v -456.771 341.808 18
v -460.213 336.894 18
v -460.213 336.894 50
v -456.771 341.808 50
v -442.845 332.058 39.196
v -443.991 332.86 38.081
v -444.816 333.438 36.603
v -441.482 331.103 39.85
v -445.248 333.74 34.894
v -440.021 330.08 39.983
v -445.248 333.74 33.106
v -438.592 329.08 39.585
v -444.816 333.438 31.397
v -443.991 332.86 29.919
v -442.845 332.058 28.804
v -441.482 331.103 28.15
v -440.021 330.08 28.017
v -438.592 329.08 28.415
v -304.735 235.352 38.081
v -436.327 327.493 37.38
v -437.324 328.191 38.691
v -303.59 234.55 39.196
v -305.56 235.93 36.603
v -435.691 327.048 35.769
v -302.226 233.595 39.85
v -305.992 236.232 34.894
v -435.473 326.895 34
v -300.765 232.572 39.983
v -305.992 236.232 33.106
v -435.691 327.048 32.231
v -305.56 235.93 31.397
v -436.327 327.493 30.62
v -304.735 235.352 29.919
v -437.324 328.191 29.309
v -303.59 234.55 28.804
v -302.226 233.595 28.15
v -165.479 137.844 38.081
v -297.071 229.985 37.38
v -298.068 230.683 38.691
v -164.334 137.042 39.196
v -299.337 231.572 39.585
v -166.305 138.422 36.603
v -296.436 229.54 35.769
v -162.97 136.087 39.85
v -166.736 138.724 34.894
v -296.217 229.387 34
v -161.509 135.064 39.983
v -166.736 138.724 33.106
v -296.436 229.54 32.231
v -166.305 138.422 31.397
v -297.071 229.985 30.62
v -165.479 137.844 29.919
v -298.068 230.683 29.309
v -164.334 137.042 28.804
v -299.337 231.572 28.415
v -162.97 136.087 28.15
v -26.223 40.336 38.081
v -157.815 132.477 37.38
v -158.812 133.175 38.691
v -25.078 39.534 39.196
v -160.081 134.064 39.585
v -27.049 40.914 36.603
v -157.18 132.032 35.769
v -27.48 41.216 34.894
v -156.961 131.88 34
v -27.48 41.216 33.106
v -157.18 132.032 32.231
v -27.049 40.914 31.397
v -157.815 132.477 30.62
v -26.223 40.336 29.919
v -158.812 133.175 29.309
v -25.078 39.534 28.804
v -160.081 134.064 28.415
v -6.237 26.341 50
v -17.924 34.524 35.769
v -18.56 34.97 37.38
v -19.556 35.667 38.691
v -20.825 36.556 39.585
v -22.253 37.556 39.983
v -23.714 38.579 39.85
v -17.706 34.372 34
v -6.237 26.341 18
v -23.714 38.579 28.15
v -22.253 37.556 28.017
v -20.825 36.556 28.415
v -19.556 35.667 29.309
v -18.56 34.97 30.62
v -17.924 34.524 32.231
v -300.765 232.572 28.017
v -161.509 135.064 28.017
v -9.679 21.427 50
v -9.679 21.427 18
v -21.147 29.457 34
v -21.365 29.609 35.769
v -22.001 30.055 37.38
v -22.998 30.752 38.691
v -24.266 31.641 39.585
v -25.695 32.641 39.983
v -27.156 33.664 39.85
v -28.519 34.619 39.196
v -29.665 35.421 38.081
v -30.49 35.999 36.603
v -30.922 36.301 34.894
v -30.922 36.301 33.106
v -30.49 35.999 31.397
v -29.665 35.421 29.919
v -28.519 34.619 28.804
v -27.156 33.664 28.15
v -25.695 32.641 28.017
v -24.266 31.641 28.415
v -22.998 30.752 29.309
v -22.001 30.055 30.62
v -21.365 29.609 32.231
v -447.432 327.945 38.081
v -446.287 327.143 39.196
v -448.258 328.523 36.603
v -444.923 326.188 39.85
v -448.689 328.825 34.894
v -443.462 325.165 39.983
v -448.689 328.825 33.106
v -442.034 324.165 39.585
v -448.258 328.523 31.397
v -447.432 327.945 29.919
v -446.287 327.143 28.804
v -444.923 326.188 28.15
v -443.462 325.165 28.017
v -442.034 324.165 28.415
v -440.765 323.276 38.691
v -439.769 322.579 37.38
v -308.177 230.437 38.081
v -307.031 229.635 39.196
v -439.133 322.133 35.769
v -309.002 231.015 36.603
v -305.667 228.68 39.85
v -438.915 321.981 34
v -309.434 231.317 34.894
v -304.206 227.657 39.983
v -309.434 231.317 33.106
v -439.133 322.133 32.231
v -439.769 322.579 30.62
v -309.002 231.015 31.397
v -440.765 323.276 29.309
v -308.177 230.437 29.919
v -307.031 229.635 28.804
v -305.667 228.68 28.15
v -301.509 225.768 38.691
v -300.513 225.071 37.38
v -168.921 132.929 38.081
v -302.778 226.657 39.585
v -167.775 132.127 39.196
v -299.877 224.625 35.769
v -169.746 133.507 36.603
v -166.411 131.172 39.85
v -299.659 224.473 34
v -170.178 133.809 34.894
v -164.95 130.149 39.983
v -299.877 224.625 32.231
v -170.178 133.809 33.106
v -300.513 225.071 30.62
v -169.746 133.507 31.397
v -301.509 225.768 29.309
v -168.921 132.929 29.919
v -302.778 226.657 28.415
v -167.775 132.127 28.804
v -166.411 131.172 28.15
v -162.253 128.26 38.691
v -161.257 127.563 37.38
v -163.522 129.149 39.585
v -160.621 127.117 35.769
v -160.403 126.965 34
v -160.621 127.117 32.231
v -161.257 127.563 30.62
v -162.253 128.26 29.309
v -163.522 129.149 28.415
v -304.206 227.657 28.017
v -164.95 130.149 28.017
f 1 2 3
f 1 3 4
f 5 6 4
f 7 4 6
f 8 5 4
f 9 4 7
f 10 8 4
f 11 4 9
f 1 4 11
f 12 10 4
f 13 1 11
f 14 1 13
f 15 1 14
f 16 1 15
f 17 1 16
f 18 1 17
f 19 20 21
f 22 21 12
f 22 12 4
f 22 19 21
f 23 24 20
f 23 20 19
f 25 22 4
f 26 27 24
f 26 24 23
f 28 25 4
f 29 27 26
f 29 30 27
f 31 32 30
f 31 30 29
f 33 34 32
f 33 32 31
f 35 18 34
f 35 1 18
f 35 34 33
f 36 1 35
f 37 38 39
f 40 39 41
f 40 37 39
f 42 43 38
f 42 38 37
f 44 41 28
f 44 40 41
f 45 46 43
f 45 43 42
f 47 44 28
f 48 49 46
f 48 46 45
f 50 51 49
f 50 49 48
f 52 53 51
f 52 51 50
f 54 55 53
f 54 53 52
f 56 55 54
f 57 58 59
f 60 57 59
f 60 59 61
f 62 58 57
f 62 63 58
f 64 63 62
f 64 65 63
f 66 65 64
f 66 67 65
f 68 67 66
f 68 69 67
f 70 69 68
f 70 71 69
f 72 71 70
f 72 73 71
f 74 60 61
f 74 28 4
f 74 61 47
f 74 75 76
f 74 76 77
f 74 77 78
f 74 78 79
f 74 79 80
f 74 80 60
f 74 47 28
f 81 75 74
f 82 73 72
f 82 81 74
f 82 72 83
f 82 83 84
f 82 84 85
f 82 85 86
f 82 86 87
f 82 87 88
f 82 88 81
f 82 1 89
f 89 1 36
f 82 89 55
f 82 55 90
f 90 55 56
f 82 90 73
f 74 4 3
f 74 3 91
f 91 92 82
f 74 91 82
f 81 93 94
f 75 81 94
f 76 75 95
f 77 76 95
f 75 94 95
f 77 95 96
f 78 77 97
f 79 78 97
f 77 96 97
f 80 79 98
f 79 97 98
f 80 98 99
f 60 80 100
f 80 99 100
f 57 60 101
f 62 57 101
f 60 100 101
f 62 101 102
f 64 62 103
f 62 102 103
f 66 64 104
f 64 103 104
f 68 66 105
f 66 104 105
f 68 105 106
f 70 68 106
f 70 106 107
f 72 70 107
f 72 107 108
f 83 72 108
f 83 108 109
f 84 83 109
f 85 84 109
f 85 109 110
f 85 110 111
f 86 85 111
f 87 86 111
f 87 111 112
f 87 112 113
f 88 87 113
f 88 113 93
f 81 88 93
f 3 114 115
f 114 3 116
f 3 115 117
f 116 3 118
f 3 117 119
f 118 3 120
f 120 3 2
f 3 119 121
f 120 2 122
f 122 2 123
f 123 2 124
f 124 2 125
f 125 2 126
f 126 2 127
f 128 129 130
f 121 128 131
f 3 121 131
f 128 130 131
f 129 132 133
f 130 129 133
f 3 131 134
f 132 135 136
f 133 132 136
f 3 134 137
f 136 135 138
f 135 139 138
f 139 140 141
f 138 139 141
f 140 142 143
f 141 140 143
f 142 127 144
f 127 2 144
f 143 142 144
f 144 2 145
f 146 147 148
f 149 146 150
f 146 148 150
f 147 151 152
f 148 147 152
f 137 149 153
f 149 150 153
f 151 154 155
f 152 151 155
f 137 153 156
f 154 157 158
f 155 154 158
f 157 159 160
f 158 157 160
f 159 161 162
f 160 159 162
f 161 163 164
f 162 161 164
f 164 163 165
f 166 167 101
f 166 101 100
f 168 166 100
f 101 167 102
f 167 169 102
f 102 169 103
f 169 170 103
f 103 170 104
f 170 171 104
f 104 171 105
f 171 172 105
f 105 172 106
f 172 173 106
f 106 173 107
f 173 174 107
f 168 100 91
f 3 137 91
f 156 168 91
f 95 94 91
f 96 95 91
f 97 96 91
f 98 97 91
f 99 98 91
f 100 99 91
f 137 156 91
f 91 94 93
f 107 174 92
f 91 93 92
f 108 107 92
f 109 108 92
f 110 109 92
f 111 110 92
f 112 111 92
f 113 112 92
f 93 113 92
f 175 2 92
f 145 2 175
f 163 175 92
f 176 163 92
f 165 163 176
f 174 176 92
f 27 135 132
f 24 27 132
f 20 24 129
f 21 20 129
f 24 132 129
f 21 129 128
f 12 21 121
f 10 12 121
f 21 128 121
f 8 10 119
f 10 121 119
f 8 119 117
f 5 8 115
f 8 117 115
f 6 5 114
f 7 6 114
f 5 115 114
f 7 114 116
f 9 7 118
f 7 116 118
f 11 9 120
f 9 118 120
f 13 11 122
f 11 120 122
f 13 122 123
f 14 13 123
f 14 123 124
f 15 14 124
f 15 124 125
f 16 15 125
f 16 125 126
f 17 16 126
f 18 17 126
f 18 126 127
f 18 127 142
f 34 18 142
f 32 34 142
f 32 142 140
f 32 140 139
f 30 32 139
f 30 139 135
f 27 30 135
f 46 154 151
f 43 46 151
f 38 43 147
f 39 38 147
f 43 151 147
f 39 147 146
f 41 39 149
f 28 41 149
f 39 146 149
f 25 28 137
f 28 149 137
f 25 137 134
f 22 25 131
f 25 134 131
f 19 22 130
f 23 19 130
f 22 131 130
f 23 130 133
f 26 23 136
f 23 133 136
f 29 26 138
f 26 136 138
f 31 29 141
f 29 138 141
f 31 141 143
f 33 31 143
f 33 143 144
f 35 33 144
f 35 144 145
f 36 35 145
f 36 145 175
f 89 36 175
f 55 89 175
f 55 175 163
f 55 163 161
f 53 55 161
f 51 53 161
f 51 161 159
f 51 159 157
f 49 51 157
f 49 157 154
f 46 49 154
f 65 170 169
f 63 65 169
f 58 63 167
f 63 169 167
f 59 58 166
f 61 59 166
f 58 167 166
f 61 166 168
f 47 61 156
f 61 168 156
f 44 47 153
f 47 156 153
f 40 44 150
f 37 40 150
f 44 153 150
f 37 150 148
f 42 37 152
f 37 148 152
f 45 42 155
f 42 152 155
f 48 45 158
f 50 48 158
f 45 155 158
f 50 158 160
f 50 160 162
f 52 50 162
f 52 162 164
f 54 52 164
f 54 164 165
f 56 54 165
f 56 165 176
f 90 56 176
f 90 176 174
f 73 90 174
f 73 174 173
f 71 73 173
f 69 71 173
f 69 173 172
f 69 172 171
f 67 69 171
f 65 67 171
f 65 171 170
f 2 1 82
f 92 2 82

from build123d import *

# Parameters (mm, degrees)
SKETCH046_W             = 550
SKETCH046_H             = 6
PAD009_DEPTH            = 32
SKETCH047_R             = 6
POCKET004_DEPTH         = 6.001
LINEARPATTERN002_COUNT  = 4
LINEARPATTERN002_PITCH  = 170
BODY006_PLACEMENT_ANGLE = 325


with BuildPart() as part:
    # Sketch046 → Pad009 (new body)
    with BuildSketch(Plane.XY):
        with Locations((275, 3)):
            Rectangle(SKETCH046_W, SKETCH046_H)
    extrude(amount=PAD009_DEPTH)

    # Sketch047 (on Face1 of Pad009) → Pocket004 (cut, through all)
    with BuildSketch(Plane.XZ):
        with Locations((20, 16)):
            Circle(SKETCH047_R)
    pocket004 = extrude(amount=-POCKET004_DEPTH, mode=Mode.SUBTRACT)

    # LinearPattern002: Pocket004 ×4
    with Locations(*[(i * LINEARPATTERN002_PITCH, 0, 0) for i in range(1, LINEARPATTERN002_COUNT)]):
        add(pocket004, mode=Mode.SUBTRACT)


with BuildPart() as part_1:
    # Body006 placement: moved
    add(part.part.moved(Location((-460.212515, 336.893567, 18))).rotate(Axis((-460.212515, 336.893567, 18), (0, 0, 1)), BODY006_PLACEMENT_ANGLE))


solid = part_1.part
